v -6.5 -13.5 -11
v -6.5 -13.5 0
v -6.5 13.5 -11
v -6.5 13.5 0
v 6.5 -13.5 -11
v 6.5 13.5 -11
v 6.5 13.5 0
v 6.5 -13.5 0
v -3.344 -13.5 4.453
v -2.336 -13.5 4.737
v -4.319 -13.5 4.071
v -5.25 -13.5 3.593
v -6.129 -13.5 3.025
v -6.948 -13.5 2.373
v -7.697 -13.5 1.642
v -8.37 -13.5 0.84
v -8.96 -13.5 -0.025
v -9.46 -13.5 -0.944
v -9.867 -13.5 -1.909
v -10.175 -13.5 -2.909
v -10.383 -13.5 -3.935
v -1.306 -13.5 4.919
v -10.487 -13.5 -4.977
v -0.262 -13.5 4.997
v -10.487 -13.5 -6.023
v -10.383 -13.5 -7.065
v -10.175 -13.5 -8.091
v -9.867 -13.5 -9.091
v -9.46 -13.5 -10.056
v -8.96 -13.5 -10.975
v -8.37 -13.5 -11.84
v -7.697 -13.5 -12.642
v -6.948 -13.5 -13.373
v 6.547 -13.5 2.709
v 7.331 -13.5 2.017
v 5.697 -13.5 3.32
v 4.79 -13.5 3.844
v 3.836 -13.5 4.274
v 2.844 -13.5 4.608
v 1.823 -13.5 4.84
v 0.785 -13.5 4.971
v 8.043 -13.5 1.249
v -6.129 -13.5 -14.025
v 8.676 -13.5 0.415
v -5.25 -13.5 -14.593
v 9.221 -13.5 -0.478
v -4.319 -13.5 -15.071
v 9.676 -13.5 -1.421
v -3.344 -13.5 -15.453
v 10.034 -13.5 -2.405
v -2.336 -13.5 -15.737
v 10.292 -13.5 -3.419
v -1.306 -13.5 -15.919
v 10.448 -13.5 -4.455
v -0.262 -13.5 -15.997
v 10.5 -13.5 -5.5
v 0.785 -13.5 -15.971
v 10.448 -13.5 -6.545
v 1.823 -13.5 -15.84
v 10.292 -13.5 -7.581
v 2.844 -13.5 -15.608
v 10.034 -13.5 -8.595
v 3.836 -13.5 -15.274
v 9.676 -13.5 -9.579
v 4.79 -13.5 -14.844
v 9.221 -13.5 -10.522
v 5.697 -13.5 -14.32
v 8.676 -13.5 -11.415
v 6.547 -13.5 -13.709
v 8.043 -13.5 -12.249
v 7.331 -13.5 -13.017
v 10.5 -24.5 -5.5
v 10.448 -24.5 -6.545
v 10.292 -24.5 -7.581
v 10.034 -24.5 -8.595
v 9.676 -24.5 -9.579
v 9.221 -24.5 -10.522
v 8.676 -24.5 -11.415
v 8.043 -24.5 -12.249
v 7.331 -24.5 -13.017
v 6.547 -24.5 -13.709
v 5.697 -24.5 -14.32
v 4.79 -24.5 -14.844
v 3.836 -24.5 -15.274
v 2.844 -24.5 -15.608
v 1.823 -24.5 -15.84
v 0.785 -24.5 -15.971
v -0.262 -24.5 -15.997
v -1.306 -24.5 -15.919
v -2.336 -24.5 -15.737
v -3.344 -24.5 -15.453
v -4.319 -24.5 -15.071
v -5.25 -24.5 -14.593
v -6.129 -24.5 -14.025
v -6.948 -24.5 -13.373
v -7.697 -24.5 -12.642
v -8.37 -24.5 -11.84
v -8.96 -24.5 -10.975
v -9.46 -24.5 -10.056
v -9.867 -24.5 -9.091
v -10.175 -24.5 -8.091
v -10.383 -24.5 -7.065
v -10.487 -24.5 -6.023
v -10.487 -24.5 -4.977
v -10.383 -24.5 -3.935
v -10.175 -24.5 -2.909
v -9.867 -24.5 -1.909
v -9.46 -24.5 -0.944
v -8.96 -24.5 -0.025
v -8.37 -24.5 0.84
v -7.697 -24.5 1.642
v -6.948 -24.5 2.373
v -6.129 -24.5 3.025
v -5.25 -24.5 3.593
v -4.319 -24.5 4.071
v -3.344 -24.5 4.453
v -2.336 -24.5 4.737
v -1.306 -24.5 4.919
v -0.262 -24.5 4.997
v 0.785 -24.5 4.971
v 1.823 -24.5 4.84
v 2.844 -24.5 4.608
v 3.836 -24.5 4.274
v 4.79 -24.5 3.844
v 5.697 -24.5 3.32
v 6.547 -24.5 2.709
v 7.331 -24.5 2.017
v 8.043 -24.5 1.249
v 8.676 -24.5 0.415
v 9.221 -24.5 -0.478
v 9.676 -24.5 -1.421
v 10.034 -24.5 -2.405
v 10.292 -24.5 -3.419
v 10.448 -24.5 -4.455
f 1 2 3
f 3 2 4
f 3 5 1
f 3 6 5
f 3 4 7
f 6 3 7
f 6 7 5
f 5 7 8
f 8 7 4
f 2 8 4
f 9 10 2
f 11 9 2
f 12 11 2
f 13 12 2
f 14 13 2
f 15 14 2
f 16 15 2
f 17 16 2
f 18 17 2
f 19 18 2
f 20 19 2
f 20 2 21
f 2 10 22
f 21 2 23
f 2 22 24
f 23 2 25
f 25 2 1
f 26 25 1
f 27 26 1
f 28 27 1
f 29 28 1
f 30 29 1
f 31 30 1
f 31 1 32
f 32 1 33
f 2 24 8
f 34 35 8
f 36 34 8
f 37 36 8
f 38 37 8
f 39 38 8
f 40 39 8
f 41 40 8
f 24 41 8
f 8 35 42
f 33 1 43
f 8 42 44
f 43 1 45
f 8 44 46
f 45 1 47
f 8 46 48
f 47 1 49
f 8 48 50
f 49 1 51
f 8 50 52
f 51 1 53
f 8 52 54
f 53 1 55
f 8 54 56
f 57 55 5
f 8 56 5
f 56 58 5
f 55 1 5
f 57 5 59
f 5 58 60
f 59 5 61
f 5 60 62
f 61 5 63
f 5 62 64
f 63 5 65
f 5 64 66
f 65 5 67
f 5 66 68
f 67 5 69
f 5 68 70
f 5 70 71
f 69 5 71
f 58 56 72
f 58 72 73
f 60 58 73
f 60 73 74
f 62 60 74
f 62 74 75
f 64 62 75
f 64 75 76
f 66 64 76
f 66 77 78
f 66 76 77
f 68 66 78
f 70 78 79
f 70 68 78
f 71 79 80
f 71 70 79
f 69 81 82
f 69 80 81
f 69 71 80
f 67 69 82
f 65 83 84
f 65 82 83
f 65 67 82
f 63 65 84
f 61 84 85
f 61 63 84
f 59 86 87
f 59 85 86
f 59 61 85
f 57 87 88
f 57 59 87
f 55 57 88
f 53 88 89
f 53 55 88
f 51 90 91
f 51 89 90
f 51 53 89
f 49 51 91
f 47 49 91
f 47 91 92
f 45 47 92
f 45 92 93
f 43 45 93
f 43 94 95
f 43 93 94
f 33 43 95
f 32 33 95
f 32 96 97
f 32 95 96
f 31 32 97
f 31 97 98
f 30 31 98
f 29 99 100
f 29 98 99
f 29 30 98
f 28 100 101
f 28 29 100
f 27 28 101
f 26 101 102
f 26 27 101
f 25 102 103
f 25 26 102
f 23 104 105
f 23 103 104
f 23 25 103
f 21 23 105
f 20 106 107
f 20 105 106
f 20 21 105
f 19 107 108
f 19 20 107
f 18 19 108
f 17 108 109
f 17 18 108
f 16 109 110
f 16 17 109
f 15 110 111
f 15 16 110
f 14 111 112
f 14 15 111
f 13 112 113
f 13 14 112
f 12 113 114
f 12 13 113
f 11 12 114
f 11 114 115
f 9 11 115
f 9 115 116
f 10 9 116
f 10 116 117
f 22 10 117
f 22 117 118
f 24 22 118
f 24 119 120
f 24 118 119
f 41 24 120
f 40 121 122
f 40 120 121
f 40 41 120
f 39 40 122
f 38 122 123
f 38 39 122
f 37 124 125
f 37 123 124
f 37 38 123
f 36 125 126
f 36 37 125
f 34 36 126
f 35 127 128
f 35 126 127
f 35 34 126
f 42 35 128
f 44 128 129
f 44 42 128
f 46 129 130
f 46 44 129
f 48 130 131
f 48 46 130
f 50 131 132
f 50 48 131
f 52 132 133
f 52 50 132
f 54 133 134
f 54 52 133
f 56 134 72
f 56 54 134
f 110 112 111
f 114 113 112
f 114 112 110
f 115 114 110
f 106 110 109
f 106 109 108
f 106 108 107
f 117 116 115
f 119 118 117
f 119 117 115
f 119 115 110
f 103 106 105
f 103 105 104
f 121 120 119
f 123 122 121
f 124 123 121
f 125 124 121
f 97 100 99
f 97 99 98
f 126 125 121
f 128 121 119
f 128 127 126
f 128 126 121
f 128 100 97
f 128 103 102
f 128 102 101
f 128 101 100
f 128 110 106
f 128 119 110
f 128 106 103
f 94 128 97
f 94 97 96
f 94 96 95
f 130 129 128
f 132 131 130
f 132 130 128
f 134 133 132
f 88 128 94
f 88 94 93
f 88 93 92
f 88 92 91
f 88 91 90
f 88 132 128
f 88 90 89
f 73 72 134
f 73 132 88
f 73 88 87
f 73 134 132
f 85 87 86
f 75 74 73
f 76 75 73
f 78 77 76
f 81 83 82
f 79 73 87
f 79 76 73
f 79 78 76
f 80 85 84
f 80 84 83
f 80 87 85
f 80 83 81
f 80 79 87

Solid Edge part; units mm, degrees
sketch "Sketch1" plane through (0, 0, 0) normal (0, 0, 1) x (1, 0, 0)
  line L0 (6.5, -13.5) -> (-6.5, -13.5)
  line L1 (-6.5, -13.5) -> (-6.5, 13.5)
  line L2 (-6.5, 13.5) -> (6.5, 13.5)
  line L3 (6.5, 13.5) -> (6.5, -13.5)
  dimension "D1" = 13
  dimension "D2" = 27
extrude "Protrusion1" add sketch "Sketch1" against normal blind 11
sketch "Sketch2" plane through (0, -13.5, -5.5) normal (0, -1, 0) x (1, 0, 0)
  circle A0 centre (0, 0) radius 10.5
  dimension "D1" = 21
  dimension "D2" = 5.5
extrude "Extrusionsausprägung_2" add sketch "Sketch2" along normal blind 11
